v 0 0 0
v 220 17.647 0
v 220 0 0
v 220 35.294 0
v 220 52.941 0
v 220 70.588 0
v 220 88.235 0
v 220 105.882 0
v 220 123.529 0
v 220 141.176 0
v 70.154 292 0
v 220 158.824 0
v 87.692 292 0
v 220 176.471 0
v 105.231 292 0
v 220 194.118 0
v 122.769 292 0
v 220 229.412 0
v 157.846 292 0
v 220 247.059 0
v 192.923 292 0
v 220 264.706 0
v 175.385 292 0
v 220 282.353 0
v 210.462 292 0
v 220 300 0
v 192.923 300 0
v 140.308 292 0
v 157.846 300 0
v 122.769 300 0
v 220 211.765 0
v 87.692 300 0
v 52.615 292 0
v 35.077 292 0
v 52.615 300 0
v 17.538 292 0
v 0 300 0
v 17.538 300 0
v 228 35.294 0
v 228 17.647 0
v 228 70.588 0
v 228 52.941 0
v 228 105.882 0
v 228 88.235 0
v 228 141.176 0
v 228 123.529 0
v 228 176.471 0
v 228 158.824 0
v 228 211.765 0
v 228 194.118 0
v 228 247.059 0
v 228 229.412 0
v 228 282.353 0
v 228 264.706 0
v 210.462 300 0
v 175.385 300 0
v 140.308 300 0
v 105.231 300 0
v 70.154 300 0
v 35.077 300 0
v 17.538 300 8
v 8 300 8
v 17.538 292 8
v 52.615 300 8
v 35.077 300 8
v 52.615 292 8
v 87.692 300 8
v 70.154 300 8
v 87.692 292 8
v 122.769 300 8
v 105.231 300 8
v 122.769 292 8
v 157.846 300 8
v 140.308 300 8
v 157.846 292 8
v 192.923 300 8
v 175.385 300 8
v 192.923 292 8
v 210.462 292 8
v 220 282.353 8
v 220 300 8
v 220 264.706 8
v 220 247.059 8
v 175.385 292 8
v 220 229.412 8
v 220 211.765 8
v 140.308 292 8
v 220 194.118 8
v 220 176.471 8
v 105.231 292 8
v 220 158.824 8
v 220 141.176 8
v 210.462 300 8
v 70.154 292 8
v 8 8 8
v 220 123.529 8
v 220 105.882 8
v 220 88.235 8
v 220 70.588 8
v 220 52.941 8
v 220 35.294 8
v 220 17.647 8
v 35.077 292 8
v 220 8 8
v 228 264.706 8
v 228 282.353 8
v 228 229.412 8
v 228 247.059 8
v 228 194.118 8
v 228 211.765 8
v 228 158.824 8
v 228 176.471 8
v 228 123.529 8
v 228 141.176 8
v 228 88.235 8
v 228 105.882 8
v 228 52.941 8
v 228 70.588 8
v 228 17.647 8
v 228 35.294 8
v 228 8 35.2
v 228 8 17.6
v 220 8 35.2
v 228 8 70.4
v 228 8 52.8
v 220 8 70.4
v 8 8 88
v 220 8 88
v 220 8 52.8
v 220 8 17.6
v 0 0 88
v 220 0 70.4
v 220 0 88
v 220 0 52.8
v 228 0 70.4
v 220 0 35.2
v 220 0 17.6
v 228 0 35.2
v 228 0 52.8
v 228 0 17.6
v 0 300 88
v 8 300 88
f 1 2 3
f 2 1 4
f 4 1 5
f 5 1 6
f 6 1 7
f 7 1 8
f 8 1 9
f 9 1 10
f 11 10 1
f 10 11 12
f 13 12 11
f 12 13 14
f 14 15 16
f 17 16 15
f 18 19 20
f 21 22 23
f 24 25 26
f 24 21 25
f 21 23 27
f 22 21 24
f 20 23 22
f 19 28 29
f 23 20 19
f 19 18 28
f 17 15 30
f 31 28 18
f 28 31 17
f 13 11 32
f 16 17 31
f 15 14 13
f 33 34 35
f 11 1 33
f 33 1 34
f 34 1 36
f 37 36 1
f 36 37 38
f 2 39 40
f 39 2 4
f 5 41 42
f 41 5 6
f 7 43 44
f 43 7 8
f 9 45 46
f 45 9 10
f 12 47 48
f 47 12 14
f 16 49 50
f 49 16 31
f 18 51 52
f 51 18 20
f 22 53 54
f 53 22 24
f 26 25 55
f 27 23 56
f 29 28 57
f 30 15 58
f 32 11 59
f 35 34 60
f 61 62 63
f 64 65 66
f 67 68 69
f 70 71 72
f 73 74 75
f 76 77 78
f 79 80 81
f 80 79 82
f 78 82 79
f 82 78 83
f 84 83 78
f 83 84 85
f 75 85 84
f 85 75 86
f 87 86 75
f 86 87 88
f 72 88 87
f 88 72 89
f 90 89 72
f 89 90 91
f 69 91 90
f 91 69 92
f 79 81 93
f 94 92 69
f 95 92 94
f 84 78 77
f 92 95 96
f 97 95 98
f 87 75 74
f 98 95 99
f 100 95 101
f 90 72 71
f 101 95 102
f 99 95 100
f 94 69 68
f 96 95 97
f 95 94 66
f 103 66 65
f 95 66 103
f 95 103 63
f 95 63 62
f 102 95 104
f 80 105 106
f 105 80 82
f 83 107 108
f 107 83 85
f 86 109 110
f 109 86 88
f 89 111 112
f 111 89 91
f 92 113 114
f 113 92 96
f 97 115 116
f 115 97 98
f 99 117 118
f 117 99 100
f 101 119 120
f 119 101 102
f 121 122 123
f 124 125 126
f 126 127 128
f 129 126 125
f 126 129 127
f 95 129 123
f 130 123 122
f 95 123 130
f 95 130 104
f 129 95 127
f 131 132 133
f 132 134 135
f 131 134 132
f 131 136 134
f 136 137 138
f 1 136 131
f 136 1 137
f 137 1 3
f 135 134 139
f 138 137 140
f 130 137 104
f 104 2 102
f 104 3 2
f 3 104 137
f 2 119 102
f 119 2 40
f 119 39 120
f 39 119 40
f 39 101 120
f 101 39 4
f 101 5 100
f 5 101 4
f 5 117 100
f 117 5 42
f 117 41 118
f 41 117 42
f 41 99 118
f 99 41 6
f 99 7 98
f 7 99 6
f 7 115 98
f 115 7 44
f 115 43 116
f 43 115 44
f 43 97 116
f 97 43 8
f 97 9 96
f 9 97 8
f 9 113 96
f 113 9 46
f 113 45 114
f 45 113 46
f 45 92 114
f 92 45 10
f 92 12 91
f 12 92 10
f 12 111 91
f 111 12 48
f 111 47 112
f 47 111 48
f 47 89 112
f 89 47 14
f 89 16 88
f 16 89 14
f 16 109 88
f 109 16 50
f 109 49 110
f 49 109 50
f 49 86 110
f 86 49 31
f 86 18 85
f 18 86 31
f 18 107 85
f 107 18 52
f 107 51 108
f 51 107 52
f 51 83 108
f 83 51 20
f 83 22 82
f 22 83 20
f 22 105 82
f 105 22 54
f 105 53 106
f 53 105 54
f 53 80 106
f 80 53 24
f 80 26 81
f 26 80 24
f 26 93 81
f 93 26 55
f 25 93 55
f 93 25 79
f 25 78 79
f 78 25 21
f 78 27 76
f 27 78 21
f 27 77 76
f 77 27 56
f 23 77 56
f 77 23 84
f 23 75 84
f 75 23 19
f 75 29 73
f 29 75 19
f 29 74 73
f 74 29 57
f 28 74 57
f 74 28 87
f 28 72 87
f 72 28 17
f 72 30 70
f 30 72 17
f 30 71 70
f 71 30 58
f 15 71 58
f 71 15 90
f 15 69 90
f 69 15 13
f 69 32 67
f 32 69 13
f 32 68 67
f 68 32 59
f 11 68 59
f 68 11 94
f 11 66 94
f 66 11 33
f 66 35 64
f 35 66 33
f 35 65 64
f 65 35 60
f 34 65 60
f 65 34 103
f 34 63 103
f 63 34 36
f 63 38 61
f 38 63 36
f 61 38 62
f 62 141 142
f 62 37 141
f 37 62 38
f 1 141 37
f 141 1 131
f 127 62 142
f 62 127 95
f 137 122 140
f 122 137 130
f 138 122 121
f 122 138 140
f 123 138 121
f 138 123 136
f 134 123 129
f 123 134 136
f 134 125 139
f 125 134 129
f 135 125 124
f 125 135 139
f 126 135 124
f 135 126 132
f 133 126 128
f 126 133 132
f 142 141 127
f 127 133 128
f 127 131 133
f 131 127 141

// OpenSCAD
X = 228; // primary width
Y = 300; // primary length
Z = 88; // primary height
T0 = 8; // primary thickness
fW = 18; // finger width, set to same value as T0 for most predictable results

function div(num, denom) = num / round(num / denom);
function splice(v1, v2)
=	[for (i = [0 : len(v1) + len(v2) - 1]) (i%2) ? v1[i/2] : v2[floor(i/2)]];

function triangleWave(width,height,count, phase=0)
=	[for (i = [0 : count]) [i*width, ((i+phase)%2)*height]]; 
function squareWave(width,height,count)
=	splice(triangleWave(width,height,count),triangleWave(width,height,count,1));

module fingers(width,height,length,swap=false){
	width = div(length,width);
	for(i=[swap ? 0 : width : width*2: length]){
		translate([i,0,0])
		square([width, height]);
}}
module offsetsquare(width, height, offset, offsets=[1,1,1,1]){
	translate(offset*[offsets[2],offsets[0]])
		square(	[width-offset*(offsets[2] + offsets[3]),
			height-offset*(offsets[0] + offsets[1])]
		);
		
}
module fingerplane(width,height,fingerWidth,fingerHeight,sides=[1,1,1,1]){
	difference(){
		square([width, height]);
	union() {
	if (sides[0]) {
		fingers(fingerWidth, fingerHeight, width, true);
	}
	if (sides[1]) {
		translate([0,height-fingerHeight,0])
			fingers(fingerWidth, fingerHeight, width);
	}
	if (sides[3]) {
		mirror([1,0,0])
			rotate([0,0,90])
				fingers(fingerWidth, fingerHeight, height);
	}
	if (sides[2]) {
		translate([width-fingerHeight,0,0])
			mirror([1,0,0])
				rotate([0,0,90])
					fingers(fingerWidth, fingerHeight, height, true);
	}
			
}}}

module ZnPlane(){
	linear_extrude(T0) fingerplane(X,Y,fW,T0);
}
module YnPlane(){	
	rotate([90,0,0]) translate([0,0,-T0]) linear_extrude(T0) fingerplane(X,Z,fW,T0,[0,0,1,1]);
}
module XnPlane(){
	rotate([0,-90,0]) translate([0,0,-T0]) linear_extrude(T0) fingerplane(Z,Y,fW,T0,[0,0,0,0]);
}
module ZpPlane(){
	translate([0,0,Z-T0]) ZnPlane();
}
module YpPlane(){
	translate([0,Y-T0,0]) YnPlane();
}
module XpPlane(){
	translate([X-T0,0,0]) XnPlane();
}

ZnPlane();
YnPlane();
XnPlane();
